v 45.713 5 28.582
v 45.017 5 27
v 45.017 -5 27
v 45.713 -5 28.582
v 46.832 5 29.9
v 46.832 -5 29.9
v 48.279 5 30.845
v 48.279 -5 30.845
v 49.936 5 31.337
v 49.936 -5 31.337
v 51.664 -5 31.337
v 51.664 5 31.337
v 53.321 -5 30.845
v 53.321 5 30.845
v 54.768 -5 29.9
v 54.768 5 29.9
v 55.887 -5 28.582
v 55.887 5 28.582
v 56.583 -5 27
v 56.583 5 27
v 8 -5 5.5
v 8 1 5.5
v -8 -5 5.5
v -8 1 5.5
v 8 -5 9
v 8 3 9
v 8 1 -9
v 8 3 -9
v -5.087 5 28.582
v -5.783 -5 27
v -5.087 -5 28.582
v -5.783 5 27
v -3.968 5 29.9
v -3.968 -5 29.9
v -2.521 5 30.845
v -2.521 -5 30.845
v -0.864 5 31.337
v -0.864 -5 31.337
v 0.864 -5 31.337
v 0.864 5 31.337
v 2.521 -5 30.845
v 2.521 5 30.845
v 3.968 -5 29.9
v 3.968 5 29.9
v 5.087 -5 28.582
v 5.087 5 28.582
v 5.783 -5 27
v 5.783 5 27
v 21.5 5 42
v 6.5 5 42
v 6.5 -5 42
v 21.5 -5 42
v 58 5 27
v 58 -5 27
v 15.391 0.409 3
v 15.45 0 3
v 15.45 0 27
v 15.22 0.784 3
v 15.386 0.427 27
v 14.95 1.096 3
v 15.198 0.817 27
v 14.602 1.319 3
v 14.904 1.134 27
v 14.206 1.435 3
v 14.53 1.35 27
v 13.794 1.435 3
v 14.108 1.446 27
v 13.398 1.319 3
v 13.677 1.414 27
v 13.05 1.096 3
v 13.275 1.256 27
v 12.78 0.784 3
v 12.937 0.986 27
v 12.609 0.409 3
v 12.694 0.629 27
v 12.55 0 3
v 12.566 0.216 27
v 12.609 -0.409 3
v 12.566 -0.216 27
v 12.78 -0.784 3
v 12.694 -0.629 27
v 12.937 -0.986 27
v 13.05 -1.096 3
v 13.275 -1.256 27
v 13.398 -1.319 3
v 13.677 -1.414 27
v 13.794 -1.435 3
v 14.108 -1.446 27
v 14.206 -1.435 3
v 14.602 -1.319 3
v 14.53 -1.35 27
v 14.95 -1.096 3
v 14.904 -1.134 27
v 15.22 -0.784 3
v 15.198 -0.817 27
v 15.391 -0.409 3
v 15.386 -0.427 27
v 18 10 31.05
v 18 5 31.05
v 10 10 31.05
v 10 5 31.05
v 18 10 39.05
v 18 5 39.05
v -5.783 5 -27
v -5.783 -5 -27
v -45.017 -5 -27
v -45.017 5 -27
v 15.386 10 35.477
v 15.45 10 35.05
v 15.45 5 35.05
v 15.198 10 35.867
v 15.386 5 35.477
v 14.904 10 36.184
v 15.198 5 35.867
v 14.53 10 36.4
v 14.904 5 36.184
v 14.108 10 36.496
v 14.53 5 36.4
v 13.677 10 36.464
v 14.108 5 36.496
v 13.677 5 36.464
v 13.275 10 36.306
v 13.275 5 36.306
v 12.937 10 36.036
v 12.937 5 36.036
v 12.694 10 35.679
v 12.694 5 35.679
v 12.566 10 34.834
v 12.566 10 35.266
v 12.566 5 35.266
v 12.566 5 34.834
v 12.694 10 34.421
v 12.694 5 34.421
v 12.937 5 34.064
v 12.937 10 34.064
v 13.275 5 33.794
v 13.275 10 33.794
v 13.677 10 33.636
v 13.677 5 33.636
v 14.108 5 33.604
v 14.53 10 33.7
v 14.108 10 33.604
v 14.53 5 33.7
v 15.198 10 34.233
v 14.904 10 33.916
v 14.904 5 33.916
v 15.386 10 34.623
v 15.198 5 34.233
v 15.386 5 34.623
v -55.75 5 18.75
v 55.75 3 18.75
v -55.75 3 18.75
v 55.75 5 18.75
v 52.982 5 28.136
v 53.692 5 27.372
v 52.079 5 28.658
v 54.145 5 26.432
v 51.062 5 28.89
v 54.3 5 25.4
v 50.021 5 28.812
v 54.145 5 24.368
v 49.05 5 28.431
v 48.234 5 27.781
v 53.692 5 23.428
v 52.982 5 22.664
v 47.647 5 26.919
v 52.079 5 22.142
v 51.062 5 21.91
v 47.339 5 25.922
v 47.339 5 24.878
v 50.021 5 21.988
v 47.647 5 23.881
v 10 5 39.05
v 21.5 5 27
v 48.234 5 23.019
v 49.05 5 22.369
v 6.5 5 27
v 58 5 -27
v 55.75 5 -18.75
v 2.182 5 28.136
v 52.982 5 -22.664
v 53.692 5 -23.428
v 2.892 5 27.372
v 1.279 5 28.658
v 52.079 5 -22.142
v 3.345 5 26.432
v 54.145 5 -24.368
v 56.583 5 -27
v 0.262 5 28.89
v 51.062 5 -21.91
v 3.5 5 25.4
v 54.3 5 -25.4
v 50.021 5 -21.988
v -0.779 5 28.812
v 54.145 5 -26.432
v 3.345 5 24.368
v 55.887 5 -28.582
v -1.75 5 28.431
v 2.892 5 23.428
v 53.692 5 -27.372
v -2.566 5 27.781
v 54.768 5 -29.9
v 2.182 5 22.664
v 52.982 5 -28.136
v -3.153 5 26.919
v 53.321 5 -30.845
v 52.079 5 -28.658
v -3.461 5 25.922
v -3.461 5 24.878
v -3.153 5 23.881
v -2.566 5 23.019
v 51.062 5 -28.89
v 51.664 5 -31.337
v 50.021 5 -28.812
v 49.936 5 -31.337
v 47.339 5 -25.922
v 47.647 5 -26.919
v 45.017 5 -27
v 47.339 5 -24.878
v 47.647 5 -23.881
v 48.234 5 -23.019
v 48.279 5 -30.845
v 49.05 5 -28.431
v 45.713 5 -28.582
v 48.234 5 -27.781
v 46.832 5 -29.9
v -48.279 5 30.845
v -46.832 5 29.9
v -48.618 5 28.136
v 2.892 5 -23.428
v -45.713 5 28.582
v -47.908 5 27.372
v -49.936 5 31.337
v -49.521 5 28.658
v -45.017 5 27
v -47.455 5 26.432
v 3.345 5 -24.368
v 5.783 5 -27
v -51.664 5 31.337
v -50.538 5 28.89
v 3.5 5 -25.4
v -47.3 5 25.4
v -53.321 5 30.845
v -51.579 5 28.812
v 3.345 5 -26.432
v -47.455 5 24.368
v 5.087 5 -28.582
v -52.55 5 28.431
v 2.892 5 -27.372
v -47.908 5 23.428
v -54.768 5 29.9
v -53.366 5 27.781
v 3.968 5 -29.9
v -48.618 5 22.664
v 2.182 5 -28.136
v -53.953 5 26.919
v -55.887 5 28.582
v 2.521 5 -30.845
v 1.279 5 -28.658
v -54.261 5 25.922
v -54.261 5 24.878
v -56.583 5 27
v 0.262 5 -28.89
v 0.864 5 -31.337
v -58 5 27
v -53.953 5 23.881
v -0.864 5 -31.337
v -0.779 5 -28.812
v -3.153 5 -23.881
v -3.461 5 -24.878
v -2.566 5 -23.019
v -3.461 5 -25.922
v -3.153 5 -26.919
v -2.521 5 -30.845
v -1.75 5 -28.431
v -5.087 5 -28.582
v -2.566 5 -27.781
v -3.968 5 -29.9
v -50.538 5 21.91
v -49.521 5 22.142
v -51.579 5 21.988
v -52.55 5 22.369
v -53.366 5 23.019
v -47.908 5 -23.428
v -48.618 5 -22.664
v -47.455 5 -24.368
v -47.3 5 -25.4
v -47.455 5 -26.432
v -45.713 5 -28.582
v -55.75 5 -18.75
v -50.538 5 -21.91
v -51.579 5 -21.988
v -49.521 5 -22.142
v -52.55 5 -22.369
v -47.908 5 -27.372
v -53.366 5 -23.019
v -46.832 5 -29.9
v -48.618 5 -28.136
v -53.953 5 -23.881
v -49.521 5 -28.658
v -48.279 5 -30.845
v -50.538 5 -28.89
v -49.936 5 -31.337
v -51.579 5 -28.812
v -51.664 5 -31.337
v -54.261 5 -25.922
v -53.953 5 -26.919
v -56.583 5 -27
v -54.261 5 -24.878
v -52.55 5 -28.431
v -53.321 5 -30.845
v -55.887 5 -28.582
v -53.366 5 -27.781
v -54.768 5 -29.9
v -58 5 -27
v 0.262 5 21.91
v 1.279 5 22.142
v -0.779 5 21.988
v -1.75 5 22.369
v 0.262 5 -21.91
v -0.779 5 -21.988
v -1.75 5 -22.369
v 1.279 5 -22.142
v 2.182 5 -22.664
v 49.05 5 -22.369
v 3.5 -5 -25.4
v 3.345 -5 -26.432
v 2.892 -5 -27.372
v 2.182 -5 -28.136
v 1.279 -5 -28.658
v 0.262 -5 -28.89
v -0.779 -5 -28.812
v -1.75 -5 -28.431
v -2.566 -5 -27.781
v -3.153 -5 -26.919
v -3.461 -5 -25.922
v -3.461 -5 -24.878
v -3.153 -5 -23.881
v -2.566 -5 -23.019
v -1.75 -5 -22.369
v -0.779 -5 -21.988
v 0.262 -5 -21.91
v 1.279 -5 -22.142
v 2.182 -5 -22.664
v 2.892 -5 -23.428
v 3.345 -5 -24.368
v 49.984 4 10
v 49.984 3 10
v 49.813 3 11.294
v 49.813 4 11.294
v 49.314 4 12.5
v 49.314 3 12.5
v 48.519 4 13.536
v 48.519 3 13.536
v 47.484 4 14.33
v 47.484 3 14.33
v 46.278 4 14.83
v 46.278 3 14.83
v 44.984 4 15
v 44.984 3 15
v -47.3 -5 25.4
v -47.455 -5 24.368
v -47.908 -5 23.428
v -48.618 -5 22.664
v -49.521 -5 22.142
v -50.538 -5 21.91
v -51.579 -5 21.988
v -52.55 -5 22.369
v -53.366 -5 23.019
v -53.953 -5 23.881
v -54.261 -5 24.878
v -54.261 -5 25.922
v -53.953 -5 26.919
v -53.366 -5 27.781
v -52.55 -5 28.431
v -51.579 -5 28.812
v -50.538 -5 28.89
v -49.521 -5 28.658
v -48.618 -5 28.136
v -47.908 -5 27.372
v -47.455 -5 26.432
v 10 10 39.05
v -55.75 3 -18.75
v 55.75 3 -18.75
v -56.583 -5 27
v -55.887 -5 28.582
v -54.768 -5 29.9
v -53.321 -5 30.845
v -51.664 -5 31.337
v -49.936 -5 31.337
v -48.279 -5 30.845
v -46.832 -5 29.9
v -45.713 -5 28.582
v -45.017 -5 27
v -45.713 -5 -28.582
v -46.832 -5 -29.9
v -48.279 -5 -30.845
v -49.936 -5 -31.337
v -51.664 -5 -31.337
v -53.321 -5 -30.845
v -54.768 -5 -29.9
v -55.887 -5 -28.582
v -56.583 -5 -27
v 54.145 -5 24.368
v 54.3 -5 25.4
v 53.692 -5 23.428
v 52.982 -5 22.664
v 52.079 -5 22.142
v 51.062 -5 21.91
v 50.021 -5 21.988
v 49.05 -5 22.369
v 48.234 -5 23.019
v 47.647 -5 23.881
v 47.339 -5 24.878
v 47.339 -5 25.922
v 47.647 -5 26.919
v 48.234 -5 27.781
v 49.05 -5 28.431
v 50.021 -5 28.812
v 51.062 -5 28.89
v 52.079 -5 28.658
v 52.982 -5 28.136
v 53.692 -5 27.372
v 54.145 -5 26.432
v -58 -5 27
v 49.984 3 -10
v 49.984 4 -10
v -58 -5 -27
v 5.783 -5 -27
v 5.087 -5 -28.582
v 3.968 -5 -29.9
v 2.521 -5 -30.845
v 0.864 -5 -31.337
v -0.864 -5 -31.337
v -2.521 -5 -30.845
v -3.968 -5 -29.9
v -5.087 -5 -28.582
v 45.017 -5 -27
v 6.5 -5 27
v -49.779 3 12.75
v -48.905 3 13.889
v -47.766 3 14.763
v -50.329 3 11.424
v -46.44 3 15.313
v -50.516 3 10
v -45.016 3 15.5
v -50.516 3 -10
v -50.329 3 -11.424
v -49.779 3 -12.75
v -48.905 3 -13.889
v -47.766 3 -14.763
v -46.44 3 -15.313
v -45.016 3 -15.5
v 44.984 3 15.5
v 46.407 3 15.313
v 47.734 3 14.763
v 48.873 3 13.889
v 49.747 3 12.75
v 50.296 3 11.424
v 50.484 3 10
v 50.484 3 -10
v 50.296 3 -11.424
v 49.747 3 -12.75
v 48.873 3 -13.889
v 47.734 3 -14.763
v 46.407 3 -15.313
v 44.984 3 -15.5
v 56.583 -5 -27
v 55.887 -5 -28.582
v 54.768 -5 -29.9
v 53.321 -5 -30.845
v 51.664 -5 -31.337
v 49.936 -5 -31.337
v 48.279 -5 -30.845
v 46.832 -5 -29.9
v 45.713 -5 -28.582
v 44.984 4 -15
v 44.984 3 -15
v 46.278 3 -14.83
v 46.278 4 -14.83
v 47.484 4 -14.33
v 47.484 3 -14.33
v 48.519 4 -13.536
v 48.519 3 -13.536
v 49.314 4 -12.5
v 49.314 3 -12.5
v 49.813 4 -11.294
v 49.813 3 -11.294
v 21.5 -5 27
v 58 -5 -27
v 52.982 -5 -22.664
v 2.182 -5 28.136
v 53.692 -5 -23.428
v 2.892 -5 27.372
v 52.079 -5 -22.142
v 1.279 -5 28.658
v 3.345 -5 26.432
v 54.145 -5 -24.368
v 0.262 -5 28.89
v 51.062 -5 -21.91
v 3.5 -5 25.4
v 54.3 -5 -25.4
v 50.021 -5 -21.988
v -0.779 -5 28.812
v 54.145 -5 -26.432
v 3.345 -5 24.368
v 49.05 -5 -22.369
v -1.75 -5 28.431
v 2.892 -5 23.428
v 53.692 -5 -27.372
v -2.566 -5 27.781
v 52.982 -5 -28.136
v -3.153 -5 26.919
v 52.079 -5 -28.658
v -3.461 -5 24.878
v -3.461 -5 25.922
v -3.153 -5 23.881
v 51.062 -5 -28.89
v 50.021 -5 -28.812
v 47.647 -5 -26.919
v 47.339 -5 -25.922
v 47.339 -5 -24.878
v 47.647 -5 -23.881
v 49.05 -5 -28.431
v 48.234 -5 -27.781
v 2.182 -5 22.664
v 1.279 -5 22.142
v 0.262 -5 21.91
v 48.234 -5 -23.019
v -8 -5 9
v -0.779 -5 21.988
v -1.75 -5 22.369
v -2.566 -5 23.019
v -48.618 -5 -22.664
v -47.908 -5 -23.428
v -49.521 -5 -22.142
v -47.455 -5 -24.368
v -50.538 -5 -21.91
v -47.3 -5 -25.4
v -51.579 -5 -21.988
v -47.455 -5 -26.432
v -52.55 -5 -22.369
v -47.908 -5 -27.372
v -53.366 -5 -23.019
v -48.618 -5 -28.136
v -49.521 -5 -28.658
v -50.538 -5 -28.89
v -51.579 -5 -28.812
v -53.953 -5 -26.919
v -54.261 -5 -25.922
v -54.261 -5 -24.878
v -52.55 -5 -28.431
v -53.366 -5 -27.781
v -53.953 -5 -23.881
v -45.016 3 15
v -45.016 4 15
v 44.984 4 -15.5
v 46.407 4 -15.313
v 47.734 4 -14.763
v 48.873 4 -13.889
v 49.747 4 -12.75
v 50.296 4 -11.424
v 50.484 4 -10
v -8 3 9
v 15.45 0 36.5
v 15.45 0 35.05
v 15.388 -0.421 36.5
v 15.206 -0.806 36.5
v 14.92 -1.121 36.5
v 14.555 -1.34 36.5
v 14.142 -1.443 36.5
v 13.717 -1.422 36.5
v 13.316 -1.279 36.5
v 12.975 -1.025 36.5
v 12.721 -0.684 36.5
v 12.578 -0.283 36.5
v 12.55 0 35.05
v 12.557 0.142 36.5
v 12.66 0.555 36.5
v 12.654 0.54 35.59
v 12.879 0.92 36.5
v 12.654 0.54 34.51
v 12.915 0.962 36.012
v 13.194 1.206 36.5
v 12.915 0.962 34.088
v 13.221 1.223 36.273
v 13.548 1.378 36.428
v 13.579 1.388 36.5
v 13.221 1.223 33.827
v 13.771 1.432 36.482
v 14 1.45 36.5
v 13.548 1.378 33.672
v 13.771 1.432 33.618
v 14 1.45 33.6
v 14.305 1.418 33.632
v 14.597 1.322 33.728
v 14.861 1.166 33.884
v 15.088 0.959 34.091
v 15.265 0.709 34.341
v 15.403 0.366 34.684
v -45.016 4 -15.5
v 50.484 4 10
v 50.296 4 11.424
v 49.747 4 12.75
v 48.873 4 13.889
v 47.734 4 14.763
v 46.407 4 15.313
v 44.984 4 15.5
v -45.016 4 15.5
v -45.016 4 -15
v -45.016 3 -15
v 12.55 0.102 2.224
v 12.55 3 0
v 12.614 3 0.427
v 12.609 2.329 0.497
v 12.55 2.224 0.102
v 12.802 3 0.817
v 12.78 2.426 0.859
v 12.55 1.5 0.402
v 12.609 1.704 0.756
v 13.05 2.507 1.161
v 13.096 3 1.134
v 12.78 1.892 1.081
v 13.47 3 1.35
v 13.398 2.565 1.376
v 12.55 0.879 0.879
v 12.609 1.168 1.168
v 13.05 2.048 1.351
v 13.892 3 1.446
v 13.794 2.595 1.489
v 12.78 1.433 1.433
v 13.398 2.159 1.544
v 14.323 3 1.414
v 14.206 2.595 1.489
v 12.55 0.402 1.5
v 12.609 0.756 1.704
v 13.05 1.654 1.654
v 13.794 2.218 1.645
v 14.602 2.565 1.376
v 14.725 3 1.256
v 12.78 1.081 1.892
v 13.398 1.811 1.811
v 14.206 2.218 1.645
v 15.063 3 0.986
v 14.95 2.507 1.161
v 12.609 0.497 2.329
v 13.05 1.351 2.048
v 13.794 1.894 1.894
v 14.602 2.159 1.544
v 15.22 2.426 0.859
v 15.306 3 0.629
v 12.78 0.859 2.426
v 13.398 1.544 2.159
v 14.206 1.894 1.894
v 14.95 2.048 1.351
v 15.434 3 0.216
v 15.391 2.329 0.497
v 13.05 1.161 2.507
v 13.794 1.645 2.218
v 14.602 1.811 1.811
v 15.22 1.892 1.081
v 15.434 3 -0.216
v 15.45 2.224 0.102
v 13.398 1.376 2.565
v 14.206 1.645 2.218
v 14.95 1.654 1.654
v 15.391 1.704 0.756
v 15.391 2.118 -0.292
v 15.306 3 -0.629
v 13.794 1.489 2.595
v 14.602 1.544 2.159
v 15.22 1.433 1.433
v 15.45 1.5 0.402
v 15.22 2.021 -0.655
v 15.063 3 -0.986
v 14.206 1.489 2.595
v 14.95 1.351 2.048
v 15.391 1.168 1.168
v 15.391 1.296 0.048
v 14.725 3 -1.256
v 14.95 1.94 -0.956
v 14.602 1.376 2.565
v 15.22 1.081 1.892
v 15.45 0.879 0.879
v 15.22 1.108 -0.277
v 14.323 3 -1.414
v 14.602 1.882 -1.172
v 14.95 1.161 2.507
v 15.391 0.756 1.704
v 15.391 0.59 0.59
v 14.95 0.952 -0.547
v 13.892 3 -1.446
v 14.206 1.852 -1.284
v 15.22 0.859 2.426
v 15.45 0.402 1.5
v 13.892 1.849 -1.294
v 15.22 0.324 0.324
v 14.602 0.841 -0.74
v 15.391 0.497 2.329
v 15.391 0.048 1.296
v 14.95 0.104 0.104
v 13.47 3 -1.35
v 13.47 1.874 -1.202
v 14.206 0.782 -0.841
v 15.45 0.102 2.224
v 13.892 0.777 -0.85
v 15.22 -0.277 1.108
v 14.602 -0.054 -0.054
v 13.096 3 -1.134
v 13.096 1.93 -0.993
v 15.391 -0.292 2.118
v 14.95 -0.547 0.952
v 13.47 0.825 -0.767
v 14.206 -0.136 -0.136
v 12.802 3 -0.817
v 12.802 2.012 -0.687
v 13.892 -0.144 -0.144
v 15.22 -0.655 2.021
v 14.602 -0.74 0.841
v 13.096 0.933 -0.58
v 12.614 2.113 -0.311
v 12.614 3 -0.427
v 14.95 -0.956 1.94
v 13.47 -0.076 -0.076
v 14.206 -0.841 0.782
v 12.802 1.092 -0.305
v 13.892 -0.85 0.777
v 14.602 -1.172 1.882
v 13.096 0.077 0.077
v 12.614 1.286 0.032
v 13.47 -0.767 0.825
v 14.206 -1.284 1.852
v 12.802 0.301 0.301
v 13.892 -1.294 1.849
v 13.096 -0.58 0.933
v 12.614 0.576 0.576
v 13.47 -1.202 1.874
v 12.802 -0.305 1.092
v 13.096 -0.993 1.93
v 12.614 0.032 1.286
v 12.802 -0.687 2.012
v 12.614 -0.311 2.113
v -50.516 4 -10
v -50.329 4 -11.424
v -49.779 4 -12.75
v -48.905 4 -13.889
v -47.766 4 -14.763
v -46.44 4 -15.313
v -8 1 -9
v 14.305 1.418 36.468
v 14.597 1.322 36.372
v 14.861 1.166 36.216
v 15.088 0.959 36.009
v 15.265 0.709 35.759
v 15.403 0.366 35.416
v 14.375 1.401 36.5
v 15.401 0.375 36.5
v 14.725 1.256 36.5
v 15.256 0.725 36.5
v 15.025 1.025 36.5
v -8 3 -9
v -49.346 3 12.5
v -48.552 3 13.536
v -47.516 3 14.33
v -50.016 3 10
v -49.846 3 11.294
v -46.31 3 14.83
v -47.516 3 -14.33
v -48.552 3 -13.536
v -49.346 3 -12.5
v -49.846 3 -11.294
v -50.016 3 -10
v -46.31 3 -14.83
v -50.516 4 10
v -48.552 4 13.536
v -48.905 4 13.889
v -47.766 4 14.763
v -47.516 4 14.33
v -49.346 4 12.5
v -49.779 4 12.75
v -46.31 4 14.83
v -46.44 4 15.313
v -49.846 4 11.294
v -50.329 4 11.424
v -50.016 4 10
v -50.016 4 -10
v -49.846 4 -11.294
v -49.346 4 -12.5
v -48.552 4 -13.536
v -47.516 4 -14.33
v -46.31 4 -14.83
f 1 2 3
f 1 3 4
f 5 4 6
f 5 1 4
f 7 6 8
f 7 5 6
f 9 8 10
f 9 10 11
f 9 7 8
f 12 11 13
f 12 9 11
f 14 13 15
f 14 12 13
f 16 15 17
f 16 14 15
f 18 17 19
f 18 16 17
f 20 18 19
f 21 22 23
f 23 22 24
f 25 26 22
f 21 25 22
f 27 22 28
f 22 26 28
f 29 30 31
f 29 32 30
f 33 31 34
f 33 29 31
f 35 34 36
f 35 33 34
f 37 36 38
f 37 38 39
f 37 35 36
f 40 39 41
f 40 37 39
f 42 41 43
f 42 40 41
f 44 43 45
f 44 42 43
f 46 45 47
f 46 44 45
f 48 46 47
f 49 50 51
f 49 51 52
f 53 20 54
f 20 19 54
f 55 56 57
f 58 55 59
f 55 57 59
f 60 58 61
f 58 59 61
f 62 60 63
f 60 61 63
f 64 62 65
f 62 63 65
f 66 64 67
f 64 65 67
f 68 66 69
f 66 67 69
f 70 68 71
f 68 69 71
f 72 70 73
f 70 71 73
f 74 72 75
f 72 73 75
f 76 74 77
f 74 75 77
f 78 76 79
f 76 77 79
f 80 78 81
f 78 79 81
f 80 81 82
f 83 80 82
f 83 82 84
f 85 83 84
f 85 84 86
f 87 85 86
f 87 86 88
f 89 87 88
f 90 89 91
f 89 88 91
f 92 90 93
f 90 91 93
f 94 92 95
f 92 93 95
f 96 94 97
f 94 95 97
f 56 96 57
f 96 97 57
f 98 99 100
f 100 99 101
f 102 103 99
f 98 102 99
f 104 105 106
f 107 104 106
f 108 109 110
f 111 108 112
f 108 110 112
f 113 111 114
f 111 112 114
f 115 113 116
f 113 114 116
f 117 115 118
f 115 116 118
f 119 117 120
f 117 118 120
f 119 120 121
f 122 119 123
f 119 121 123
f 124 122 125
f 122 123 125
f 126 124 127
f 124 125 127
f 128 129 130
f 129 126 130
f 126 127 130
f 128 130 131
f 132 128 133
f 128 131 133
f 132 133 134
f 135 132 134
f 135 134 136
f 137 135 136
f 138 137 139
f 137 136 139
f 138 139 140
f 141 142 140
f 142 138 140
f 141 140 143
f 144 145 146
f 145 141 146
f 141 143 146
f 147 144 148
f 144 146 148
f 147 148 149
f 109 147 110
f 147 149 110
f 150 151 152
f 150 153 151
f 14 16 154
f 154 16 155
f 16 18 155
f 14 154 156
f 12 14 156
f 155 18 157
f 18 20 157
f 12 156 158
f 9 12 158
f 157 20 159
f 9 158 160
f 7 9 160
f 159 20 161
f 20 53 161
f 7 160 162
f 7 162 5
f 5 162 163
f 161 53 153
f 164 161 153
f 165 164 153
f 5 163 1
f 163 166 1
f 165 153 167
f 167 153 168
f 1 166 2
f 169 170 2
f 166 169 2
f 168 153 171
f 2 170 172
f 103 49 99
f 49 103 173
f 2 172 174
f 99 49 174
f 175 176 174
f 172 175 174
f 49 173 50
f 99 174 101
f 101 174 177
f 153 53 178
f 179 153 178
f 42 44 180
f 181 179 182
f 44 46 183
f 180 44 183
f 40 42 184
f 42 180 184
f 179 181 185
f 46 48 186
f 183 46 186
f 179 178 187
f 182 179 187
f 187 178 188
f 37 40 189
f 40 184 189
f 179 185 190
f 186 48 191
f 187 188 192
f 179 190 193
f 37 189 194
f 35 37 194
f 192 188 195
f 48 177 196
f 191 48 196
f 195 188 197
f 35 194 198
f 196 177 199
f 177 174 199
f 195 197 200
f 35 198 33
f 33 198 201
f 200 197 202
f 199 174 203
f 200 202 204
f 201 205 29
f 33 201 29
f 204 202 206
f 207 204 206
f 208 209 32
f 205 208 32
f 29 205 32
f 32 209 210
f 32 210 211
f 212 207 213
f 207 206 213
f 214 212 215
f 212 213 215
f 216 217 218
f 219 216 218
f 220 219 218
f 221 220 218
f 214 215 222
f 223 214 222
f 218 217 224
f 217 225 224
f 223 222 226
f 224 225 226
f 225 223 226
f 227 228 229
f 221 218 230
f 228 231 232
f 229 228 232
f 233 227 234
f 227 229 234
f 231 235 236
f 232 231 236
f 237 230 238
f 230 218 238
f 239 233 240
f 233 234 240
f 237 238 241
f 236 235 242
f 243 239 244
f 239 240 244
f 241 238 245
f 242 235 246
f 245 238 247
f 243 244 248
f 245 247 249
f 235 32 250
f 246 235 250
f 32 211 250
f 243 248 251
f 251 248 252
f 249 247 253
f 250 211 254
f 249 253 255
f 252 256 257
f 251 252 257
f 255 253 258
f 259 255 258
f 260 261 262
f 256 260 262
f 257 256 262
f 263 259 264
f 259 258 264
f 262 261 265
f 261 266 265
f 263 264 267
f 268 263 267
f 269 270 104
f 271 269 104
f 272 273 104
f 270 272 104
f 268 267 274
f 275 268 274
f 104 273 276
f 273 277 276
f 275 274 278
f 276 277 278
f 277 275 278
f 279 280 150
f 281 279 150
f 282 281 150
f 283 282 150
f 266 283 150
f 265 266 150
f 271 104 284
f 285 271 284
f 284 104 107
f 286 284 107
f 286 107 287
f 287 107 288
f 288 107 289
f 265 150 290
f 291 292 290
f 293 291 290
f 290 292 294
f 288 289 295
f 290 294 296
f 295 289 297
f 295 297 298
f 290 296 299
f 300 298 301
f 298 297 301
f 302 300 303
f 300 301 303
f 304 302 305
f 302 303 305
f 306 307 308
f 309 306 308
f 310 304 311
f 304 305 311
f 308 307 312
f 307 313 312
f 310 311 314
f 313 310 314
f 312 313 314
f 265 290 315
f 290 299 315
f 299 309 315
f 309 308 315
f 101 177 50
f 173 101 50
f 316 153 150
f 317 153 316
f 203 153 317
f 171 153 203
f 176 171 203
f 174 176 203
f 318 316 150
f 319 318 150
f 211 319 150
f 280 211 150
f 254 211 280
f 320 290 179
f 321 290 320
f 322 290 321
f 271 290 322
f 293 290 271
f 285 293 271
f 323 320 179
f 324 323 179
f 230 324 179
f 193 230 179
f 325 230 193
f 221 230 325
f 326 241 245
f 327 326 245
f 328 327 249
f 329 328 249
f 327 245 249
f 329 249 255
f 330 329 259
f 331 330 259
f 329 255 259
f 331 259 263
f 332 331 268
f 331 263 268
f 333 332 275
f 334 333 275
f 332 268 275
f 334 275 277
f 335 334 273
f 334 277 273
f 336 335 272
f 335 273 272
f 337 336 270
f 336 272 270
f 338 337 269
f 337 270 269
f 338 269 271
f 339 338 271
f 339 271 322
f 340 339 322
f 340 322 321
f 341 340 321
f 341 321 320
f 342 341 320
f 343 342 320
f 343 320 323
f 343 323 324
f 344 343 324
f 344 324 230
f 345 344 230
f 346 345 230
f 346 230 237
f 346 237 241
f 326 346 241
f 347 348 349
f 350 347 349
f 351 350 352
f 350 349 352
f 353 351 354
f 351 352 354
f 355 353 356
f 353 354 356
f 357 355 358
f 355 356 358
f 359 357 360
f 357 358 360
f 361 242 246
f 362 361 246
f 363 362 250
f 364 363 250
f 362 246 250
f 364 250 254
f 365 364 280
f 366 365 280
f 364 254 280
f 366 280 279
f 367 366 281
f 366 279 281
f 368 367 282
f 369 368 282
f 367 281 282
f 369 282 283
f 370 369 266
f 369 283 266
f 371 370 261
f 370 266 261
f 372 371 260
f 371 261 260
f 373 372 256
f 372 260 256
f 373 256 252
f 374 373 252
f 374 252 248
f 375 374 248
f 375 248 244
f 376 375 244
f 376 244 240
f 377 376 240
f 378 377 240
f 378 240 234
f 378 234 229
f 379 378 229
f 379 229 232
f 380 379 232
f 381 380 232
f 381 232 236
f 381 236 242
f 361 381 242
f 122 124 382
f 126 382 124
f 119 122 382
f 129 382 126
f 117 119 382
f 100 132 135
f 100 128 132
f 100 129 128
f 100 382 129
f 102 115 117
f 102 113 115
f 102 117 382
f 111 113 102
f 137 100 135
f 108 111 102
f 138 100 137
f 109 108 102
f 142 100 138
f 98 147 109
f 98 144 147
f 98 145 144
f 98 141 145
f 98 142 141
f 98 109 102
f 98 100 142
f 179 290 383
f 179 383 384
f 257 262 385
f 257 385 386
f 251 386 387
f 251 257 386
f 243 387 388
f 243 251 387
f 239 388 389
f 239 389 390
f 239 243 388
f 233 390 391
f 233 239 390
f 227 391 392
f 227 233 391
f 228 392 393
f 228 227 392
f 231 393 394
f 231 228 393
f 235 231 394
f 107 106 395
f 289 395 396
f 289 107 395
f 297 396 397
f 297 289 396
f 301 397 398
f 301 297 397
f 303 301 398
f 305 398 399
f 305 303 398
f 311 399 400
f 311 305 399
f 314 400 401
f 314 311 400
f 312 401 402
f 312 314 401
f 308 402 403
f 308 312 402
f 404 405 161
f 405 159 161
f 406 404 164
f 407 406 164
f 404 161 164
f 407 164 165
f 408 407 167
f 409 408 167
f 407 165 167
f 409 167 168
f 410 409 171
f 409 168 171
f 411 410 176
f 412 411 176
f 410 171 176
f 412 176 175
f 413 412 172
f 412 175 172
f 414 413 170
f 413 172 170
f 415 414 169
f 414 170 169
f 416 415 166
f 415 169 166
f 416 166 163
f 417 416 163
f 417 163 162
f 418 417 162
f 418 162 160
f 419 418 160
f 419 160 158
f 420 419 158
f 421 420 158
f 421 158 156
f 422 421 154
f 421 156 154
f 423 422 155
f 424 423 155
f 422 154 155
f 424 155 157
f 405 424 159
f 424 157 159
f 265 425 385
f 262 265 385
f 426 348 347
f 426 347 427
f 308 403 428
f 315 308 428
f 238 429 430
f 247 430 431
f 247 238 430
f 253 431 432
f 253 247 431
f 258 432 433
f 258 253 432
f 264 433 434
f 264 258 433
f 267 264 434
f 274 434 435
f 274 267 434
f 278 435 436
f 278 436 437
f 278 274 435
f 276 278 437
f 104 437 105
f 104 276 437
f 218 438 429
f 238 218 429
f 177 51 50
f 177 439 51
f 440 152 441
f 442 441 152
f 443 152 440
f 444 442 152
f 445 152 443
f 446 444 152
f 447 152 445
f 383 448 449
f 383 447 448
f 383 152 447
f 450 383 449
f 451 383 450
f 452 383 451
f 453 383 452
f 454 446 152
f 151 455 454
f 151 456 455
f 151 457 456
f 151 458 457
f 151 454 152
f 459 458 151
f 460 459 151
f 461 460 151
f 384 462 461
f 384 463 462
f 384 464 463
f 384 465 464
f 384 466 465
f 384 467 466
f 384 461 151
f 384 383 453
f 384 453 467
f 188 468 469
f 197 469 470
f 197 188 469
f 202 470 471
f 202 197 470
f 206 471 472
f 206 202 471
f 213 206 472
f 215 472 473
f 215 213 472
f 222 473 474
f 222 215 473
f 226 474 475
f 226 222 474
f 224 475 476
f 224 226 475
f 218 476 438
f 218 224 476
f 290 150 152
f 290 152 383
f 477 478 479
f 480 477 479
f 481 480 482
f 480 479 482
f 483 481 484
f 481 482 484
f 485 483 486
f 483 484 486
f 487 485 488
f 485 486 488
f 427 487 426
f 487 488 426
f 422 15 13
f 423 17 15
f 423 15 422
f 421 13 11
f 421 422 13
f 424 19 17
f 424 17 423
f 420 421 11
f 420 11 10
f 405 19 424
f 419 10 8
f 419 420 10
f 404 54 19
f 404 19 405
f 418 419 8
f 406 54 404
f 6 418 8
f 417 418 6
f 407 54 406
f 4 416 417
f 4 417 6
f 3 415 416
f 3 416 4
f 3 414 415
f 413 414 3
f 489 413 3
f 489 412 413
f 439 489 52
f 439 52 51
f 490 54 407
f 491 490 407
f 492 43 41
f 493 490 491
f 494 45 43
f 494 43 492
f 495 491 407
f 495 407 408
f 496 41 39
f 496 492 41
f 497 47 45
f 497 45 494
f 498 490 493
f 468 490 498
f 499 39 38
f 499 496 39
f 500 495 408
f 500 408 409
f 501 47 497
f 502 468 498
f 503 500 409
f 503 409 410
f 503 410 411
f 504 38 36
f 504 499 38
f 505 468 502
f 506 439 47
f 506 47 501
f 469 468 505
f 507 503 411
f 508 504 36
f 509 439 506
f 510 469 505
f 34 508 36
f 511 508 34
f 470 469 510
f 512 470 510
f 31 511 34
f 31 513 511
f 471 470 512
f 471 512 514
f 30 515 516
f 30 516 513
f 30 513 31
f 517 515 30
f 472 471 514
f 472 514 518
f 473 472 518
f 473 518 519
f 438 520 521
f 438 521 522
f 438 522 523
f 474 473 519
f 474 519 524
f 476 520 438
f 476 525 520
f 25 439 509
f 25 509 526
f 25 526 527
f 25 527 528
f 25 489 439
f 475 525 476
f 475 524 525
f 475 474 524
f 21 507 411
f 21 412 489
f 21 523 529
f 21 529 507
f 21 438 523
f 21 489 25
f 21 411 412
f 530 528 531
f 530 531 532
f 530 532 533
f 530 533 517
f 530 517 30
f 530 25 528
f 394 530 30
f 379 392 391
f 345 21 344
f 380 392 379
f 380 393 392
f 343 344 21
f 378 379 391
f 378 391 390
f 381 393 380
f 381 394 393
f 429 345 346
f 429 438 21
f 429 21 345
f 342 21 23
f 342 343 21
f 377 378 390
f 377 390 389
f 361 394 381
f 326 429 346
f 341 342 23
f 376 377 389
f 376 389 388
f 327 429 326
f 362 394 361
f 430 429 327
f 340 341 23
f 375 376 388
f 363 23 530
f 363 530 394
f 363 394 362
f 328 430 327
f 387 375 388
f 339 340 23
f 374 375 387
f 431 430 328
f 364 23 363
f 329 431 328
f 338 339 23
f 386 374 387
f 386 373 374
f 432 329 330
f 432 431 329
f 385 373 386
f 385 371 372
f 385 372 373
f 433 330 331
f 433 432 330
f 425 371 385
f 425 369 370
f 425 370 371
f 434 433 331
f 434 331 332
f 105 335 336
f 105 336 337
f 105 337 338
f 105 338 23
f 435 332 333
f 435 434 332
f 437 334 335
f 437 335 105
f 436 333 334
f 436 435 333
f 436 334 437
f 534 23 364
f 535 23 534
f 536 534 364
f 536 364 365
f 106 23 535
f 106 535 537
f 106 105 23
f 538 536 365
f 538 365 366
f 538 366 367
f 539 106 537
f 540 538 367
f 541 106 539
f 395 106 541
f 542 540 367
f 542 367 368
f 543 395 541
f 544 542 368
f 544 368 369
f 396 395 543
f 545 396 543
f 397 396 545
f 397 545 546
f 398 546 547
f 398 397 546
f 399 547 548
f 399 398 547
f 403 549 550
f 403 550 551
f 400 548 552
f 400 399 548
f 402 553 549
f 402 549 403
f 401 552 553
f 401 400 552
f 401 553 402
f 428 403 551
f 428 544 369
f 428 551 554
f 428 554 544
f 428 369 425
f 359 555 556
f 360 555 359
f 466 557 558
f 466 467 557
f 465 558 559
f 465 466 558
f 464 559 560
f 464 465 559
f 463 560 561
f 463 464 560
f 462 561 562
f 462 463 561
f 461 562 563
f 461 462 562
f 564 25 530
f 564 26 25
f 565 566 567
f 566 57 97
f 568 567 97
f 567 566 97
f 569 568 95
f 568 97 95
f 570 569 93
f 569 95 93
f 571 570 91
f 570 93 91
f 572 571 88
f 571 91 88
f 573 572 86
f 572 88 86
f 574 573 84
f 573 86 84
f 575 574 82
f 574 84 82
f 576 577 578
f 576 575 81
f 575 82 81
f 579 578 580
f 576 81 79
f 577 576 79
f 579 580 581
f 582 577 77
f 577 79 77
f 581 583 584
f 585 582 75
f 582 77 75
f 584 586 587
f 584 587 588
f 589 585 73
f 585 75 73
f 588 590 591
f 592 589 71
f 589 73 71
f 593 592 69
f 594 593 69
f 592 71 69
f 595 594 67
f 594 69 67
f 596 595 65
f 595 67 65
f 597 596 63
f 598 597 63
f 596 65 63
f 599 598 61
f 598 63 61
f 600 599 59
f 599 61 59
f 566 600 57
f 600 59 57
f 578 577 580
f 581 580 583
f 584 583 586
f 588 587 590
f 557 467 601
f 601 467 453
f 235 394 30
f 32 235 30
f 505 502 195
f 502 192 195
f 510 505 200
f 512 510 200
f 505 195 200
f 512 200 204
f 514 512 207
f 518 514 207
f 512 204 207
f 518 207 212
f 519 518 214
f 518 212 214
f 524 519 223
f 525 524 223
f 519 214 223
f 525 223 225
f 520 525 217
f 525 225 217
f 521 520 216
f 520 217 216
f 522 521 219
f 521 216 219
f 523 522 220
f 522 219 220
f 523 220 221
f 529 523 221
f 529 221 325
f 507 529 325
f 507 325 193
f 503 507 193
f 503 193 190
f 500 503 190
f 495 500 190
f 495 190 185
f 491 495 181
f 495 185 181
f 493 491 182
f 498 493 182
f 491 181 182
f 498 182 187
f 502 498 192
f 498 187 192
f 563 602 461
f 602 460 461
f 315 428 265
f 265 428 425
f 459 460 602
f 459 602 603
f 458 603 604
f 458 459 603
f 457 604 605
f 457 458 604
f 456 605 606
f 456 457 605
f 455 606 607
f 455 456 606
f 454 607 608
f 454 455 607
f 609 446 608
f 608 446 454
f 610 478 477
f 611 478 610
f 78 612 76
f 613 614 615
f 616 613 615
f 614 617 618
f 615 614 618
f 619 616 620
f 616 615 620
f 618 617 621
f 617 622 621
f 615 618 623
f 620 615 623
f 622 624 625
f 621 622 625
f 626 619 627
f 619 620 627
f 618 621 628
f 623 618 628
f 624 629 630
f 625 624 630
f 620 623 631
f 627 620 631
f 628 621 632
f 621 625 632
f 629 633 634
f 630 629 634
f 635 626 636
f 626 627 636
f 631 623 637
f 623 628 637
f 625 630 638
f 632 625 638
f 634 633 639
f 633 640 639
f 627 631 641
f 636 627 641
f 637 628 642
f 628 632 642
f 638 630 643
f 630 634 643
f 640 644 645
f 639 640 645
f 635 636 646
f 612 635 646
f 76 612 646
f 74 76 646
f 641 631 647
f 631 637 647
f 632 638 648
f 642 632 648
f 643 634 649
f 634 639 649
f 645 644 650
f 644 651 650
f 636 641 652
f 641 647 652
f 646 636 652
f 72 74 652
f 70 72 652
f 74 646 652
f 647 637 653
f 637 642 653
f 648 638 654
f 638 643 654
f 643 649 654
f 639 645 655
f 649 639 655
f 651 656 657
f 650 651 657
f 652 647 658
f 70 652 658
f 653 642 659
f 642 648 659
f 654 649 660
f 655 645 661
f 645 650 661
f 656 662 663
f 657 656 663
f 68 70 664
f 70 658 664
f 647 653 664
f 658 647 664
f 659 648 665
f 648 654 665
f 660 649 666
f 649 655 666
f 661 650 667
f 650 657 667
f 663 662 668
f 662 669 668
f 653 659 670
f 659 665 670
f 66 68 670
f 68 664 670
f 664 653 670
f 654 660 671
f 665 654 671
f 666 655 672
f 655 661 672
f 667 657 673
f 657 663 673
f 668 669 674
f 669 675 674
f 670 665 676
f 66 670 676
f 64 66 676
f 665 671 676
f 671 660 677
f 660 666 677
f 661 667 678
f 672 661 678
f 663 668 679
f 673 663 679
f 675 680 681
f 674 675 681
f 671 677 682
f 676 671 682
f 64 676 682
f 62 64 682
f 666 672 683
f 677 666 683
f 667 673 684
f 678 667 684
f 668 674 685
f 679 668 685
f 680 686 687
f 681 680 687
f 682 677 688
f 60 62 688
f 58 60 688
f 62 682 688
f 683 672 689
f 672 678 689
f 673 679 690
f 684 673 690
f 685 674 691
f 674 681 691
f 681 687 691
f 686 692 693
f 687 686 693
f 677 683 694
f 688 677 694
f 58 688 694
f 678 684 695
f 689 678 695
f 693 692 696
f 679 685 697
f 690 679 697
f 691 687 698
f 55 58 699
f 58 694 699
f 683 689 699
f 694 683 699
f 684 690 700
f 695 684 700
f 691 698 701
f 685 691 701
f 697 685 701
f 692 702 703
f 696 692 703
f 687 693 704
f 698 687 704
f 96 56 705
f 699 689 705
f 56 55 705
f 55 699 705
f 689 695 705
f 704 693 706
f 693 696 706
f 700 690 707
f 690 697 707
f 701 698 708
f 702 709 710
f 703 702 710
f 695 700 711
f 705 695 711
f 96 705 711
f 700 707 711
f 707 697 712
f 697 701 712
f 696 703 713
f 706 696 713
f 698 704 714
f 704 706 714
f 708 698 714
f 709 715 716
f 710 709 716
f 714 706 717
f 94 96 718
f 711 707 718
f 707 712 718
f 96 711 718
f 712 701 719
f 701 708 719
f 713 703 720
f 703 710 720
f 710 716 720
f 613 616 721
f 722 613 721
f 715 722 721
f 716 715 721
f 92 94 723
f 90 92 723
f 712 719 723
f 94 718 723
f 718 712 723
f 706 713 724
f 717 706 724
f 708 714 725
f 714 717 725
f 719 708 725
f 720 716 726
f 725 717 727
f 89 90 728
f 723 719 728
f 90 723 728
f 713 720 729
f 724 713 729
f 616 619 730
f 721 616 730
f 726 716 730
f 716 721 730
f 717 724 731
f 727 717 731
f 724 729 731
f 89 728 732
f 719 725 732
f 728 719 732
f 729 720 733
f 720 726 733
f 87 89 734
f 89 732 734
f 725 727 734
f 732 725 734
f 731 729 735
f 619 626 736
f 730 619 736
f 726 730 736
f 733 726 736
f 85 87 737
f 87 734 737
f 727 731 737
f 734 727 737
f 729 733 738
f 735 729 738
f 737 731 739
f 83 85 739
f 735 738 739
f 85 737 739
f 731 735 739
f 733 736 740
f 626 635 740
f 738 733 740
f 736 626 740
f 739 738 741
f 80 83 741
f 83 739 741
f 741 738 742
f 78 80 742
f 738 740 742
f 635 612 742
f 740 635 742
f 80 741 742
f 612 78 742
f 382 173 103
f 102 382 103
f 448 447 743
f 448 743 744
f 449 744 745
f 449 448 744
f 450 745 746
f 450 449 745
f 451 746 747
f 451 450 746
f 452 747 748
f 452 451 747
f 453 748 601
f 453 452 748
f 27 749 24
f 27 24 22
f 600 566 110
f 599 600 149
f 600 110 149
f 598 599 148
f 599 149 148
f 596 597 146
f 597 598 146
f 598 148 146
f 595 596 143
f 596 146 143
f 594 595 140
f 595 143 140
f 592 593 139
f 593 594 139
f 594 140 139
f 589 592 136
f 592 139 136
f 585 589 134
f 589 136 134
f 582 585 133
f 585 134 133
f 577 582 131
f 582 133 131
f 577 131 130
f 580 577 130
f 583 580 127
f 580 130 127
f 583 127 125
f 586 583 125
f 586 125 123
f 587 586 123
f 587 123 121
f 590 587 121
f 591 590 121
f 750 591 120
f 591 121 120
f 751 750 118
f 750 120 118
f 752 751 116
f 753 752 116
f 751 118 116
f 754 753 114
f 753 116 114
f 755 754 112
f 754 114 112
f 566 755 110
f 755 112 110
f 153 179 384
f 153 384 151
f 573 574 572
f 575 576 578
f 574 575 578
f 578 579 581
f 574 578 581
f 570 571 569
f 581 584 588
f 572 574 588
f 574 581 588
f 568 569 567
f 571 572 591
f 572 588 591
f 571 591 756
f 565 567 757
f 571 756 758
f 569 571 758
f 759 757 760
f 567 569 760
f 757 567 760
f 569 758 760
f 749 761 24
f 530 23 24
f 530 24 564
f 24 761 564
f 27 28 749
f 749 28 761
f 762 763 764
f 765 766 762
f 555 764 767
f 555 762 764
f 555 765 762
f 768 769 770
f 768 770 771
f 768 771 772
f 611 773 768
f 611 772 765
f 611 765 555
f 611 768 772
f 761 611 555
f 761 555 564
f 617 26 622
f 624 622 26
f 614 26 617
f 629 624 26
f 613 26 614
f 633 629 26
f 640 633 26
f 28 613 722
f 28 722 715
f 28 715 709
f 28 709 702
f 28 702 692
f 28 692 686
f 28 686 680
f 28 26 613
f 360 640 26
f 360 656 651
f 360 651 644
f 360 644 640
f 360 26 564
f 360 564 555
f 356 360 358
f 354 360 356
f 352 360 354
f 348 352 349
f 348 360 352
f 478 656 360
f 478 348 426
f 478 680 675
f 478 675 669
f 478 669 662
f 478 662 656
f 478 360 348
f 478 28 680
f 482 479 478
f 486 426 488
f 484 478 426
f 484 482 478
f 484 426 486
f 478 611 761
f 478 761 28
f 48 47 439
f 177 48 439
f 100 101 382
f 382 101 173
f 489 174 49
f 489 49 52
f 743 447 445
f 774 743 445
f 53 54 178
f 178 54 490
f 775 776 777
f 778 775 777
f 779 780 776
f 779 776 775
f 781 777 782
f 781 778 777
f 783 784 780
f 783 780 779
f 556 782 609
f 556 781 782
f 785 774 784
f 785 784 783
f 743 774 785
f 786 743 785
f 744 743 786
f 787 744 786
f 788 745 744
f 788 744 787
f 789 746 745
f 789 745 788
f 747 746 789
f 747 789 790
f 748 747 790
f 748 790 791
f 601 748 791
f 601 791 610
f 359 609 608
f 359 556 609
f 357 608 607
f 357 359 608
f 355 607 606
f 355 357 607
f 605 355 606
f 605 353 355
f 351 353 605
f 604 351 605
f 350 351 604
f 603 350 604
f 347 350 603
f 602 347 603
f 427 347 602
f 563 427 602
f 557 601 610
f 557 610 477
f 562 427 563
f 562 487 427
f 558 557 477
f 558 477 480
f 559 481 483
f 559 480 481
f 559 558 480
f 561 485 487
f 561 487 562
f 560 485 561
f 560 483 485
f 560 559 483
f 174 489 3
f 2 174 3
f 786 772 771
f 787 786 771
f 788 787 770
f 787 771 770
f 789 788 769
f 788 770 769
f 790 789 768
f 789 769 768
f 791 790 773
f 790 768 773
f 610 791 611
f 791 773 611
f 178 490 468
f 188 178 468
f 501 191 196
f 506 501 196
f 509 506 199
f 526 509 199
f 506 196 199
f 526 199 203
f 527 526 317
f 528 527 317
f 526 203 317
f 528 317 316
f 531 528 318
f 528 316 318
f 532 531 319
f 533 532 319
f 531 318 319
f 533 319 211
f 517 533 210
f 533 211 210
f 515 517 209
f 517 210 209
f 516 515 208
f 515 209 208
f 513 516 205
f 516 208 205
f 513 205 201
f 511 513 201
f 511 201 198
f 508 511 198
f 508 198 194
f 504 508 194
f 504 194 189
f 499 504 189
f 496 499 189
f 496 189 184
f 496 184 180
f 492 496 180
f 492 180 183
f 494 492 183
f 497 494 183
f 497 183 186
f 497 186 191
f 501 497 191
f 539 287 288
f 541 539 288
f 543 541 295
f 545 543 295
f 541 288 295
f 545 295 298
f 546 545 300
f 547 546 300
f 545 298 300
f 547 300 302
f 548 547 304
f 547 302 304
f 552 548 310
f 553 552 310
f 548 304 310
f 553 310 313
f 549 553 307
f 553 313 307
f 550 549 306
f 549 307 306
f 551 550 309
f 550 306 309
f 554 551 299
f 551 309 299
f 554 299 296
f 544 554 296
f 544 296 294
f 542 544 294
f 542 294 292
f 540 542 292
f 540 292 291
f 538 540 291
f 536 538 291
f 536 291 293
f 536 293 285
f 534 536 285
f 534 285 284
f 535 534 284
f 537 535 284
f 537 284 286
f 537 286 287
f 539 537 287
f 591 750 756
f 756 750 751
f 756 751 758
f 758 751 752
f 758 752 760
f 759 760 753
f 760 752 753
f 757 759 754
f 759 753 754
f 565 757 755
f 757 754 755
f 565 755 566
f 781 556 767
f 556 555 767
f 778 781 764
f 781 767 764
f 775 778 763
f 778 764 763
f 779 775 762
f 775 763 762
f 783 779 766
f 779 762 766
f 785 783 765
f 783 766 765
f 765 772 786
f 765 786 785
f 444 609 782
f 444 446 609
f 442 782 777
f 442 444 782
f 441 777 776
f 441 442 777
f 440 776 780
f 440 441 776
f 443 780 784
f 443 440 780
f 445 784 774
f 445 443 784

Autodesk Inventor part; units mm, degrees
ref_plane "YZ Plane" through (0, 0, 0) normal (1, 0, 0) x (0, 1, 0)
ref_plane "XZ Plane" through (0, 0, 0) normal (0, 1, 0) x (-1, 0, 0)
ref_plane "XY Plane" through (0, 0, 0) normal (0, 0, 1) x (1, 0, 0)
sketch "Sketch1" plane through (0, 0, 0) normal (0, 1, 0) x (-1, 0, 0)
  line L0 (58, 27) -> (-58, 27)
  line L1 (-58, 27) -> (-58, -27)
  line L2 (-58, -27) -> (58, -27)
  line L3 (58, -27) -> (58, 27)
  line L4 (58, 27) -> (-58, -27) construction
  line L5 (-58, 27) -> (58, -27) construction
  point P0 (0, 0)
  dimension "d0" = 116
  dimension "d1" = 54
extrude "Body" add sketch "Sketch1" along normal mid plane 10
sketch "Sketch2" plane through (0, 5, 0) normal (0, 1, 0) x (1, 0, 0)
  line L0 (-55.75, 18.75) -> (55.75, 18.75)
  line L1 (55.75, 18.75) -> (55.75, -18.75)
  line L2 (55.75, -18.75) -> (-55.75, -18.75)
  line L3 (-55.75, -18.75) -> (-55.75, 18.75)
  line L4 (-55.75, 18.75) -> (55.75, -18.75) construction
  line L5 (55.75, 18.75) -> (-55.75, -18.75) construction
  point P0 (0, 0)
  dimension "d4" = 111.5
  dimension "d5" = 37.5
extrude "Top Socket" cut sketch "Sketch2" against normal blind 2
sketch "Sketch3" plane through (0, 3, 0) normal (0, 1, 0) x (1, 0, 0)
  line L0 (-8, -9) -> (8, -9)
  line L1 (8, -9) -> (8, 9)
  line L2 (8, 9) -> (-8, 9)
  line L3 (-8, 9) -> (-8, -9)
  line L4 (-8, -9) -> (8, 9) construction
  line L5 (8, -9) -> (-8, 9) construction
  point P0 (0, 0)
  dimension "d29" = 18
  dimension "d30" = 16
extrude "Photoelectrode Bay" cut sketch "Sketch3" against normal blind 2
sketch "Sketch4" plane through (0, 3, 0) normal (0, 1, 0) x (1, 0, 0)
  circle A0 centre (14, 0) radius 1.45
  line L0 (-55.75, -18.75) -> (-55.75, 18.75) projected
  line L1 (-55.75, 0) -> (55.75, 0)
  line L2 (55.75, 18.75) -> (55.75, -18.75) projected
  line L3 (-55.75, -3) -> (55.75, -3)
  line L4 (8, 9) -> (8, -9) projected
  point P0 (0, 0)
  dimension "d11" = 2.9
  dimension "d20" = 3
  dimension "d97" = 6
revolve "Ref elec" cut sketch "Sketch4" angle 90 about axis through (-55.75, 3, 3) along (-1, 0, 0) contours L1 A0 | A0 L1
sketch "Sketch7" plane through (-58, 5, 27) normal (0, 0, 1) x (1, 0, 0)
  circle A0 centre (72, -5) radius 1.45
  circle A1 centre (72, -5) radius 1.45 projected
  point P0 (58, -5)
  dimension "d21" = 2.9
extrude "Ref elec length" cut sketch "Sketch7" against normal up to surface (24 mm away)
sketch "Sketch8" plane through (-58, 5, 27) normal (0, 0, 1) x (1, 0, 0)
  line L0 (116, -10) -> (0, -10) projected
  line L1 (113.75, 0) -> (2.25, 0) projected
  line L2 (64.5, 0) -> (79.5, 0)
  line L3 (79.5, 0) -> (79.5, -10)
  line L4 (79.5, -10) -> (64.5, -10)
  line L5 (64.5, -10) -> (64.5, 0)
  line L6 (79.5, 0) -> (64.5, -10) construction
  line L7 (116, -10) -> (116, 0) projected
  point P0 (58, -5)
  point P1 (72, -5)
  point P2 (72, -10)
  dimension "d108" = 15
  dimension "d109" = 0
sketch "Sketch9" plane through (0, 1, 0) normal (0, 1, 0) x (1, 0, 0)
  line L0 (8, -9) -> (-8, -9) projected
  line L1 (8, -9) -> (-8, -9) projected
  line L2 (-8, -9) -> (8, -9)
  line L3 (8, -9) -> (8, -5.5)
  line L4 (8, -5.5) -> (-8, -5.5)
  line L5 (-8, -5.5) -> (-8, -9)
  dimension "d70" = 3.5
extrude "Photoelectrode Hole" cut sketch "Sketch9" against normal through all
sketch "Sketch12" plane through (0, 5, 0) normal (0, 1, 0) x (1, 0, 0)
  line L0 (58, 27) -> (-58, 27) projected
  circle A0 centre (-50.8, 25.4) radius 6
  line L1 (-58, -27) -> (-58, 27) projected
  line L2 (-58, 0) -> (58, 0)
  line L3 (58, 27) -> (58, -27) projected
  line L4 (-58, -27) -> (58, -27) projected
  line L5 (0, -27) -> (0, 27)
  circle A1 centre (50.8, 25.4) radius 6
  circle A2 centre (-50.8, -25.4) radius 6
  circle A3 centre (50.8, -25.4) radius 6
  line L6 (-50.8, 25.4) -> (50.8, 25.4)
  line L7 (-50.8, -25.4) -> (50.8, -25.4)
  circle A4 centre (0, 25.4) radius 6
  circle A5 centre (0, -25.4) radius 6
  point P0 (0, 0)
  dimension "d40" = 25.4
  dimension "d49" = 50.8
  dimension "d57" = 12
extrude "Screw clamp boss" add sketch "Sketch12" against normal up to surface (10 mm away) contours A1 L0 | L0 A1 | A4 L6 L5 L0 | L0 A4 | A5 L7 L5 | L5 L7 A5 | A4 L6 L5 | L5 L6 A4 | A3 L4 | L4 A3 | L5 L6 A4 L0 | L7 A5 L4 L5 | L5 L4 A5 L7 | A0 L0 | L0 A0 | A2 L4 | L4 A2 | L4 A5
sketch "Sketch15" plane through (0, 5, 0) normal (0, 1, 0) x (1, 0, 0)
  circle A0 centre (0, 25.4) radius 3.5
  arc A1 (5.7827, 27) -> (-5.7827, 27) centre (0, 25.4) ccw projected
  circle A2 centre (-50.8, 25.4) radius 3.5
  arc A3 (-45.0173, 27) -> (-56.5827, 27) centre (-50.8, 25.4) ccw projected
  line L0 (55.75, -18.75) -> (-55.75, -18.75) projected
  line L1 (0, -18.75) -> (0, 18.75)
  line L2 (-55.75, 18.75) -> (55.75, 18.75) projected
  line L3 (-58, 27) -> (-58, -27) projected
  line L4 (-58, 0) -> (58, 0)
  line L5 (58, -27) -> (58, 27) projected
  circle A4 centre (50.8, 25.4) radius 3.5
  circle A5 centre (0, -25.4) radius 3.5
  circle A6 centre (-50.8, -25.4) radius 3.5
  circle A7 centre (50.8, -25.4) radius 3.5
  point P0 (0, 0)
  dimension "d60" = 7
extrude "Screw Clamp Hole" cut sketch "Sketch15" against normal through all
sketch "Sketch18" plane through (-0.0162, 3, 0) normal (0, 1, 0) x (1, 0, 0)
  line L0 (-45, -15) -> (45, -15)
  line L1 (50, -10) -> (50, 10)
  line L2 (45, 15) -> (-45, 15)
  line L3 (-50, 10) -> (-50, -10)
  line L4 (-50, -15) -> (50, 15) construction
  line L5 (50, -15) -> (-50, 15) construction
  line L6 (-45, -15.5) -> (45, -15.5)
  line L7 (50.5, -10) -> (50.5, 10)
  line L8 (45, 15.5) -> (-45, 15.5)
  line L9 (-50.5, 10) -> (-50.5, -10)
  line L10 (-50.5, -15.5) -> (50.5, 15.5) construction
  line L11 (50.5, -15.5) -> (-50.5, 15.5) construction
  arc A0 (-50, -10) -> (-45, -15) centre (-45, -10) ccw
  arc A1 (45, -15) -> (50, -10) centre (45, -10) ccw
  arc A2 (50, 10) -> (45, 15) centre (45, 10) ccw
  arc A3 (-45, 15) -> (-50, 10) centre (-45, 10) ccw
  arc A4 (-50.5, -10) -> (-45, -15.5) centre (-45, -10) ccw
  arc A5 (45, -15.5) -> (50.5, -10) centre (45, -10) ccw
  arc A6 (50.5, 10) -> (45, 15.5) centre (45, 10) ccw
  arc A7 (-45, 15.5) -> (-50.5, 10) centre (-45, 10) ccw
  point P0 (0, 0)
  dimension "d83" = 100
  dimension "d84" = 30
  dimension "d85" = 0.5
  dimension "d86" = 0.5
  dimension "d87" = 5
  dimension "d88" = 5
  dimension "d89" = 5
  dimension "d90" = 5
  dimension "d91" = 5.5
  dimension "d92" = 5.5
  dimension "d93" = 5.5
  dimension "d94" = 5.5
extrude "Knife Edge" add sketch "Sketch18" along normal blind 1
extrude "Ref Electrode Outlet" add sketch "Sketch8" along normal blind 15
sketch "Sketch19" plane through (45.0173, -5, 27) normal (0, 0, 1) x (1, 0, 0)
  circle A0 centre (-31.0173, 5) radius 1.45
  circle A1 centre (-31.0173, 5) radius 1.45 projected
  line L0 (0, 10) -> (-39.2345, 10) projected
  line L1 (-29.5673, 10) -> (-18.6963, 10)
  line L2 (-23.5173, 10) -> (0, 10) projected
  point P0 (-45.0173, 5)
extrude "Extrusion22" cut sketch "Sketch19" along normal blind 9.5
sketch "Sketch20" plane through (0, 5, 0) normal (0, 1, 0) x (1, 0, 0)
  circle A0 centre (14, -35.05) radius 1.45
  circle A1 centre (14, 0) radius 1.45 projected
  line L0 (12.55, -36.5) -> (15.45, -36.5) projected
  point P0 (0, 0)
extrude "Extrusion23" cut sketch "Sketch20" against normal blind 5 contours A0
sketch "Sketch21" plane through (0, 5, 0) normal (0, 1, 0) x (1, 0, 0)
  circle A0 centre (14, -35.05) radius 4
  circle A1 centre (14, -35.05) radius 1.45 projected
  line L0 (10, -39.05) -> (18, -39.05)
  line L1 (18, -39.05) -> (18, -31.05)
  line L2 (18, -31.05) -> (10, -31.05)
  line L3 (10, -31.05) -> (10, -39.05)
  line L4 (10, -39.05) -> (18, -31.05) construction
  line L5 (18, -39.05) -> (10, -31.05) construction
  point P0 (0, 0)
  dimension "d105" = 8
extrude "Extrusion24" add sketch "Sketch21" along normal blind 5
properties part number "Bottom 6_12"
